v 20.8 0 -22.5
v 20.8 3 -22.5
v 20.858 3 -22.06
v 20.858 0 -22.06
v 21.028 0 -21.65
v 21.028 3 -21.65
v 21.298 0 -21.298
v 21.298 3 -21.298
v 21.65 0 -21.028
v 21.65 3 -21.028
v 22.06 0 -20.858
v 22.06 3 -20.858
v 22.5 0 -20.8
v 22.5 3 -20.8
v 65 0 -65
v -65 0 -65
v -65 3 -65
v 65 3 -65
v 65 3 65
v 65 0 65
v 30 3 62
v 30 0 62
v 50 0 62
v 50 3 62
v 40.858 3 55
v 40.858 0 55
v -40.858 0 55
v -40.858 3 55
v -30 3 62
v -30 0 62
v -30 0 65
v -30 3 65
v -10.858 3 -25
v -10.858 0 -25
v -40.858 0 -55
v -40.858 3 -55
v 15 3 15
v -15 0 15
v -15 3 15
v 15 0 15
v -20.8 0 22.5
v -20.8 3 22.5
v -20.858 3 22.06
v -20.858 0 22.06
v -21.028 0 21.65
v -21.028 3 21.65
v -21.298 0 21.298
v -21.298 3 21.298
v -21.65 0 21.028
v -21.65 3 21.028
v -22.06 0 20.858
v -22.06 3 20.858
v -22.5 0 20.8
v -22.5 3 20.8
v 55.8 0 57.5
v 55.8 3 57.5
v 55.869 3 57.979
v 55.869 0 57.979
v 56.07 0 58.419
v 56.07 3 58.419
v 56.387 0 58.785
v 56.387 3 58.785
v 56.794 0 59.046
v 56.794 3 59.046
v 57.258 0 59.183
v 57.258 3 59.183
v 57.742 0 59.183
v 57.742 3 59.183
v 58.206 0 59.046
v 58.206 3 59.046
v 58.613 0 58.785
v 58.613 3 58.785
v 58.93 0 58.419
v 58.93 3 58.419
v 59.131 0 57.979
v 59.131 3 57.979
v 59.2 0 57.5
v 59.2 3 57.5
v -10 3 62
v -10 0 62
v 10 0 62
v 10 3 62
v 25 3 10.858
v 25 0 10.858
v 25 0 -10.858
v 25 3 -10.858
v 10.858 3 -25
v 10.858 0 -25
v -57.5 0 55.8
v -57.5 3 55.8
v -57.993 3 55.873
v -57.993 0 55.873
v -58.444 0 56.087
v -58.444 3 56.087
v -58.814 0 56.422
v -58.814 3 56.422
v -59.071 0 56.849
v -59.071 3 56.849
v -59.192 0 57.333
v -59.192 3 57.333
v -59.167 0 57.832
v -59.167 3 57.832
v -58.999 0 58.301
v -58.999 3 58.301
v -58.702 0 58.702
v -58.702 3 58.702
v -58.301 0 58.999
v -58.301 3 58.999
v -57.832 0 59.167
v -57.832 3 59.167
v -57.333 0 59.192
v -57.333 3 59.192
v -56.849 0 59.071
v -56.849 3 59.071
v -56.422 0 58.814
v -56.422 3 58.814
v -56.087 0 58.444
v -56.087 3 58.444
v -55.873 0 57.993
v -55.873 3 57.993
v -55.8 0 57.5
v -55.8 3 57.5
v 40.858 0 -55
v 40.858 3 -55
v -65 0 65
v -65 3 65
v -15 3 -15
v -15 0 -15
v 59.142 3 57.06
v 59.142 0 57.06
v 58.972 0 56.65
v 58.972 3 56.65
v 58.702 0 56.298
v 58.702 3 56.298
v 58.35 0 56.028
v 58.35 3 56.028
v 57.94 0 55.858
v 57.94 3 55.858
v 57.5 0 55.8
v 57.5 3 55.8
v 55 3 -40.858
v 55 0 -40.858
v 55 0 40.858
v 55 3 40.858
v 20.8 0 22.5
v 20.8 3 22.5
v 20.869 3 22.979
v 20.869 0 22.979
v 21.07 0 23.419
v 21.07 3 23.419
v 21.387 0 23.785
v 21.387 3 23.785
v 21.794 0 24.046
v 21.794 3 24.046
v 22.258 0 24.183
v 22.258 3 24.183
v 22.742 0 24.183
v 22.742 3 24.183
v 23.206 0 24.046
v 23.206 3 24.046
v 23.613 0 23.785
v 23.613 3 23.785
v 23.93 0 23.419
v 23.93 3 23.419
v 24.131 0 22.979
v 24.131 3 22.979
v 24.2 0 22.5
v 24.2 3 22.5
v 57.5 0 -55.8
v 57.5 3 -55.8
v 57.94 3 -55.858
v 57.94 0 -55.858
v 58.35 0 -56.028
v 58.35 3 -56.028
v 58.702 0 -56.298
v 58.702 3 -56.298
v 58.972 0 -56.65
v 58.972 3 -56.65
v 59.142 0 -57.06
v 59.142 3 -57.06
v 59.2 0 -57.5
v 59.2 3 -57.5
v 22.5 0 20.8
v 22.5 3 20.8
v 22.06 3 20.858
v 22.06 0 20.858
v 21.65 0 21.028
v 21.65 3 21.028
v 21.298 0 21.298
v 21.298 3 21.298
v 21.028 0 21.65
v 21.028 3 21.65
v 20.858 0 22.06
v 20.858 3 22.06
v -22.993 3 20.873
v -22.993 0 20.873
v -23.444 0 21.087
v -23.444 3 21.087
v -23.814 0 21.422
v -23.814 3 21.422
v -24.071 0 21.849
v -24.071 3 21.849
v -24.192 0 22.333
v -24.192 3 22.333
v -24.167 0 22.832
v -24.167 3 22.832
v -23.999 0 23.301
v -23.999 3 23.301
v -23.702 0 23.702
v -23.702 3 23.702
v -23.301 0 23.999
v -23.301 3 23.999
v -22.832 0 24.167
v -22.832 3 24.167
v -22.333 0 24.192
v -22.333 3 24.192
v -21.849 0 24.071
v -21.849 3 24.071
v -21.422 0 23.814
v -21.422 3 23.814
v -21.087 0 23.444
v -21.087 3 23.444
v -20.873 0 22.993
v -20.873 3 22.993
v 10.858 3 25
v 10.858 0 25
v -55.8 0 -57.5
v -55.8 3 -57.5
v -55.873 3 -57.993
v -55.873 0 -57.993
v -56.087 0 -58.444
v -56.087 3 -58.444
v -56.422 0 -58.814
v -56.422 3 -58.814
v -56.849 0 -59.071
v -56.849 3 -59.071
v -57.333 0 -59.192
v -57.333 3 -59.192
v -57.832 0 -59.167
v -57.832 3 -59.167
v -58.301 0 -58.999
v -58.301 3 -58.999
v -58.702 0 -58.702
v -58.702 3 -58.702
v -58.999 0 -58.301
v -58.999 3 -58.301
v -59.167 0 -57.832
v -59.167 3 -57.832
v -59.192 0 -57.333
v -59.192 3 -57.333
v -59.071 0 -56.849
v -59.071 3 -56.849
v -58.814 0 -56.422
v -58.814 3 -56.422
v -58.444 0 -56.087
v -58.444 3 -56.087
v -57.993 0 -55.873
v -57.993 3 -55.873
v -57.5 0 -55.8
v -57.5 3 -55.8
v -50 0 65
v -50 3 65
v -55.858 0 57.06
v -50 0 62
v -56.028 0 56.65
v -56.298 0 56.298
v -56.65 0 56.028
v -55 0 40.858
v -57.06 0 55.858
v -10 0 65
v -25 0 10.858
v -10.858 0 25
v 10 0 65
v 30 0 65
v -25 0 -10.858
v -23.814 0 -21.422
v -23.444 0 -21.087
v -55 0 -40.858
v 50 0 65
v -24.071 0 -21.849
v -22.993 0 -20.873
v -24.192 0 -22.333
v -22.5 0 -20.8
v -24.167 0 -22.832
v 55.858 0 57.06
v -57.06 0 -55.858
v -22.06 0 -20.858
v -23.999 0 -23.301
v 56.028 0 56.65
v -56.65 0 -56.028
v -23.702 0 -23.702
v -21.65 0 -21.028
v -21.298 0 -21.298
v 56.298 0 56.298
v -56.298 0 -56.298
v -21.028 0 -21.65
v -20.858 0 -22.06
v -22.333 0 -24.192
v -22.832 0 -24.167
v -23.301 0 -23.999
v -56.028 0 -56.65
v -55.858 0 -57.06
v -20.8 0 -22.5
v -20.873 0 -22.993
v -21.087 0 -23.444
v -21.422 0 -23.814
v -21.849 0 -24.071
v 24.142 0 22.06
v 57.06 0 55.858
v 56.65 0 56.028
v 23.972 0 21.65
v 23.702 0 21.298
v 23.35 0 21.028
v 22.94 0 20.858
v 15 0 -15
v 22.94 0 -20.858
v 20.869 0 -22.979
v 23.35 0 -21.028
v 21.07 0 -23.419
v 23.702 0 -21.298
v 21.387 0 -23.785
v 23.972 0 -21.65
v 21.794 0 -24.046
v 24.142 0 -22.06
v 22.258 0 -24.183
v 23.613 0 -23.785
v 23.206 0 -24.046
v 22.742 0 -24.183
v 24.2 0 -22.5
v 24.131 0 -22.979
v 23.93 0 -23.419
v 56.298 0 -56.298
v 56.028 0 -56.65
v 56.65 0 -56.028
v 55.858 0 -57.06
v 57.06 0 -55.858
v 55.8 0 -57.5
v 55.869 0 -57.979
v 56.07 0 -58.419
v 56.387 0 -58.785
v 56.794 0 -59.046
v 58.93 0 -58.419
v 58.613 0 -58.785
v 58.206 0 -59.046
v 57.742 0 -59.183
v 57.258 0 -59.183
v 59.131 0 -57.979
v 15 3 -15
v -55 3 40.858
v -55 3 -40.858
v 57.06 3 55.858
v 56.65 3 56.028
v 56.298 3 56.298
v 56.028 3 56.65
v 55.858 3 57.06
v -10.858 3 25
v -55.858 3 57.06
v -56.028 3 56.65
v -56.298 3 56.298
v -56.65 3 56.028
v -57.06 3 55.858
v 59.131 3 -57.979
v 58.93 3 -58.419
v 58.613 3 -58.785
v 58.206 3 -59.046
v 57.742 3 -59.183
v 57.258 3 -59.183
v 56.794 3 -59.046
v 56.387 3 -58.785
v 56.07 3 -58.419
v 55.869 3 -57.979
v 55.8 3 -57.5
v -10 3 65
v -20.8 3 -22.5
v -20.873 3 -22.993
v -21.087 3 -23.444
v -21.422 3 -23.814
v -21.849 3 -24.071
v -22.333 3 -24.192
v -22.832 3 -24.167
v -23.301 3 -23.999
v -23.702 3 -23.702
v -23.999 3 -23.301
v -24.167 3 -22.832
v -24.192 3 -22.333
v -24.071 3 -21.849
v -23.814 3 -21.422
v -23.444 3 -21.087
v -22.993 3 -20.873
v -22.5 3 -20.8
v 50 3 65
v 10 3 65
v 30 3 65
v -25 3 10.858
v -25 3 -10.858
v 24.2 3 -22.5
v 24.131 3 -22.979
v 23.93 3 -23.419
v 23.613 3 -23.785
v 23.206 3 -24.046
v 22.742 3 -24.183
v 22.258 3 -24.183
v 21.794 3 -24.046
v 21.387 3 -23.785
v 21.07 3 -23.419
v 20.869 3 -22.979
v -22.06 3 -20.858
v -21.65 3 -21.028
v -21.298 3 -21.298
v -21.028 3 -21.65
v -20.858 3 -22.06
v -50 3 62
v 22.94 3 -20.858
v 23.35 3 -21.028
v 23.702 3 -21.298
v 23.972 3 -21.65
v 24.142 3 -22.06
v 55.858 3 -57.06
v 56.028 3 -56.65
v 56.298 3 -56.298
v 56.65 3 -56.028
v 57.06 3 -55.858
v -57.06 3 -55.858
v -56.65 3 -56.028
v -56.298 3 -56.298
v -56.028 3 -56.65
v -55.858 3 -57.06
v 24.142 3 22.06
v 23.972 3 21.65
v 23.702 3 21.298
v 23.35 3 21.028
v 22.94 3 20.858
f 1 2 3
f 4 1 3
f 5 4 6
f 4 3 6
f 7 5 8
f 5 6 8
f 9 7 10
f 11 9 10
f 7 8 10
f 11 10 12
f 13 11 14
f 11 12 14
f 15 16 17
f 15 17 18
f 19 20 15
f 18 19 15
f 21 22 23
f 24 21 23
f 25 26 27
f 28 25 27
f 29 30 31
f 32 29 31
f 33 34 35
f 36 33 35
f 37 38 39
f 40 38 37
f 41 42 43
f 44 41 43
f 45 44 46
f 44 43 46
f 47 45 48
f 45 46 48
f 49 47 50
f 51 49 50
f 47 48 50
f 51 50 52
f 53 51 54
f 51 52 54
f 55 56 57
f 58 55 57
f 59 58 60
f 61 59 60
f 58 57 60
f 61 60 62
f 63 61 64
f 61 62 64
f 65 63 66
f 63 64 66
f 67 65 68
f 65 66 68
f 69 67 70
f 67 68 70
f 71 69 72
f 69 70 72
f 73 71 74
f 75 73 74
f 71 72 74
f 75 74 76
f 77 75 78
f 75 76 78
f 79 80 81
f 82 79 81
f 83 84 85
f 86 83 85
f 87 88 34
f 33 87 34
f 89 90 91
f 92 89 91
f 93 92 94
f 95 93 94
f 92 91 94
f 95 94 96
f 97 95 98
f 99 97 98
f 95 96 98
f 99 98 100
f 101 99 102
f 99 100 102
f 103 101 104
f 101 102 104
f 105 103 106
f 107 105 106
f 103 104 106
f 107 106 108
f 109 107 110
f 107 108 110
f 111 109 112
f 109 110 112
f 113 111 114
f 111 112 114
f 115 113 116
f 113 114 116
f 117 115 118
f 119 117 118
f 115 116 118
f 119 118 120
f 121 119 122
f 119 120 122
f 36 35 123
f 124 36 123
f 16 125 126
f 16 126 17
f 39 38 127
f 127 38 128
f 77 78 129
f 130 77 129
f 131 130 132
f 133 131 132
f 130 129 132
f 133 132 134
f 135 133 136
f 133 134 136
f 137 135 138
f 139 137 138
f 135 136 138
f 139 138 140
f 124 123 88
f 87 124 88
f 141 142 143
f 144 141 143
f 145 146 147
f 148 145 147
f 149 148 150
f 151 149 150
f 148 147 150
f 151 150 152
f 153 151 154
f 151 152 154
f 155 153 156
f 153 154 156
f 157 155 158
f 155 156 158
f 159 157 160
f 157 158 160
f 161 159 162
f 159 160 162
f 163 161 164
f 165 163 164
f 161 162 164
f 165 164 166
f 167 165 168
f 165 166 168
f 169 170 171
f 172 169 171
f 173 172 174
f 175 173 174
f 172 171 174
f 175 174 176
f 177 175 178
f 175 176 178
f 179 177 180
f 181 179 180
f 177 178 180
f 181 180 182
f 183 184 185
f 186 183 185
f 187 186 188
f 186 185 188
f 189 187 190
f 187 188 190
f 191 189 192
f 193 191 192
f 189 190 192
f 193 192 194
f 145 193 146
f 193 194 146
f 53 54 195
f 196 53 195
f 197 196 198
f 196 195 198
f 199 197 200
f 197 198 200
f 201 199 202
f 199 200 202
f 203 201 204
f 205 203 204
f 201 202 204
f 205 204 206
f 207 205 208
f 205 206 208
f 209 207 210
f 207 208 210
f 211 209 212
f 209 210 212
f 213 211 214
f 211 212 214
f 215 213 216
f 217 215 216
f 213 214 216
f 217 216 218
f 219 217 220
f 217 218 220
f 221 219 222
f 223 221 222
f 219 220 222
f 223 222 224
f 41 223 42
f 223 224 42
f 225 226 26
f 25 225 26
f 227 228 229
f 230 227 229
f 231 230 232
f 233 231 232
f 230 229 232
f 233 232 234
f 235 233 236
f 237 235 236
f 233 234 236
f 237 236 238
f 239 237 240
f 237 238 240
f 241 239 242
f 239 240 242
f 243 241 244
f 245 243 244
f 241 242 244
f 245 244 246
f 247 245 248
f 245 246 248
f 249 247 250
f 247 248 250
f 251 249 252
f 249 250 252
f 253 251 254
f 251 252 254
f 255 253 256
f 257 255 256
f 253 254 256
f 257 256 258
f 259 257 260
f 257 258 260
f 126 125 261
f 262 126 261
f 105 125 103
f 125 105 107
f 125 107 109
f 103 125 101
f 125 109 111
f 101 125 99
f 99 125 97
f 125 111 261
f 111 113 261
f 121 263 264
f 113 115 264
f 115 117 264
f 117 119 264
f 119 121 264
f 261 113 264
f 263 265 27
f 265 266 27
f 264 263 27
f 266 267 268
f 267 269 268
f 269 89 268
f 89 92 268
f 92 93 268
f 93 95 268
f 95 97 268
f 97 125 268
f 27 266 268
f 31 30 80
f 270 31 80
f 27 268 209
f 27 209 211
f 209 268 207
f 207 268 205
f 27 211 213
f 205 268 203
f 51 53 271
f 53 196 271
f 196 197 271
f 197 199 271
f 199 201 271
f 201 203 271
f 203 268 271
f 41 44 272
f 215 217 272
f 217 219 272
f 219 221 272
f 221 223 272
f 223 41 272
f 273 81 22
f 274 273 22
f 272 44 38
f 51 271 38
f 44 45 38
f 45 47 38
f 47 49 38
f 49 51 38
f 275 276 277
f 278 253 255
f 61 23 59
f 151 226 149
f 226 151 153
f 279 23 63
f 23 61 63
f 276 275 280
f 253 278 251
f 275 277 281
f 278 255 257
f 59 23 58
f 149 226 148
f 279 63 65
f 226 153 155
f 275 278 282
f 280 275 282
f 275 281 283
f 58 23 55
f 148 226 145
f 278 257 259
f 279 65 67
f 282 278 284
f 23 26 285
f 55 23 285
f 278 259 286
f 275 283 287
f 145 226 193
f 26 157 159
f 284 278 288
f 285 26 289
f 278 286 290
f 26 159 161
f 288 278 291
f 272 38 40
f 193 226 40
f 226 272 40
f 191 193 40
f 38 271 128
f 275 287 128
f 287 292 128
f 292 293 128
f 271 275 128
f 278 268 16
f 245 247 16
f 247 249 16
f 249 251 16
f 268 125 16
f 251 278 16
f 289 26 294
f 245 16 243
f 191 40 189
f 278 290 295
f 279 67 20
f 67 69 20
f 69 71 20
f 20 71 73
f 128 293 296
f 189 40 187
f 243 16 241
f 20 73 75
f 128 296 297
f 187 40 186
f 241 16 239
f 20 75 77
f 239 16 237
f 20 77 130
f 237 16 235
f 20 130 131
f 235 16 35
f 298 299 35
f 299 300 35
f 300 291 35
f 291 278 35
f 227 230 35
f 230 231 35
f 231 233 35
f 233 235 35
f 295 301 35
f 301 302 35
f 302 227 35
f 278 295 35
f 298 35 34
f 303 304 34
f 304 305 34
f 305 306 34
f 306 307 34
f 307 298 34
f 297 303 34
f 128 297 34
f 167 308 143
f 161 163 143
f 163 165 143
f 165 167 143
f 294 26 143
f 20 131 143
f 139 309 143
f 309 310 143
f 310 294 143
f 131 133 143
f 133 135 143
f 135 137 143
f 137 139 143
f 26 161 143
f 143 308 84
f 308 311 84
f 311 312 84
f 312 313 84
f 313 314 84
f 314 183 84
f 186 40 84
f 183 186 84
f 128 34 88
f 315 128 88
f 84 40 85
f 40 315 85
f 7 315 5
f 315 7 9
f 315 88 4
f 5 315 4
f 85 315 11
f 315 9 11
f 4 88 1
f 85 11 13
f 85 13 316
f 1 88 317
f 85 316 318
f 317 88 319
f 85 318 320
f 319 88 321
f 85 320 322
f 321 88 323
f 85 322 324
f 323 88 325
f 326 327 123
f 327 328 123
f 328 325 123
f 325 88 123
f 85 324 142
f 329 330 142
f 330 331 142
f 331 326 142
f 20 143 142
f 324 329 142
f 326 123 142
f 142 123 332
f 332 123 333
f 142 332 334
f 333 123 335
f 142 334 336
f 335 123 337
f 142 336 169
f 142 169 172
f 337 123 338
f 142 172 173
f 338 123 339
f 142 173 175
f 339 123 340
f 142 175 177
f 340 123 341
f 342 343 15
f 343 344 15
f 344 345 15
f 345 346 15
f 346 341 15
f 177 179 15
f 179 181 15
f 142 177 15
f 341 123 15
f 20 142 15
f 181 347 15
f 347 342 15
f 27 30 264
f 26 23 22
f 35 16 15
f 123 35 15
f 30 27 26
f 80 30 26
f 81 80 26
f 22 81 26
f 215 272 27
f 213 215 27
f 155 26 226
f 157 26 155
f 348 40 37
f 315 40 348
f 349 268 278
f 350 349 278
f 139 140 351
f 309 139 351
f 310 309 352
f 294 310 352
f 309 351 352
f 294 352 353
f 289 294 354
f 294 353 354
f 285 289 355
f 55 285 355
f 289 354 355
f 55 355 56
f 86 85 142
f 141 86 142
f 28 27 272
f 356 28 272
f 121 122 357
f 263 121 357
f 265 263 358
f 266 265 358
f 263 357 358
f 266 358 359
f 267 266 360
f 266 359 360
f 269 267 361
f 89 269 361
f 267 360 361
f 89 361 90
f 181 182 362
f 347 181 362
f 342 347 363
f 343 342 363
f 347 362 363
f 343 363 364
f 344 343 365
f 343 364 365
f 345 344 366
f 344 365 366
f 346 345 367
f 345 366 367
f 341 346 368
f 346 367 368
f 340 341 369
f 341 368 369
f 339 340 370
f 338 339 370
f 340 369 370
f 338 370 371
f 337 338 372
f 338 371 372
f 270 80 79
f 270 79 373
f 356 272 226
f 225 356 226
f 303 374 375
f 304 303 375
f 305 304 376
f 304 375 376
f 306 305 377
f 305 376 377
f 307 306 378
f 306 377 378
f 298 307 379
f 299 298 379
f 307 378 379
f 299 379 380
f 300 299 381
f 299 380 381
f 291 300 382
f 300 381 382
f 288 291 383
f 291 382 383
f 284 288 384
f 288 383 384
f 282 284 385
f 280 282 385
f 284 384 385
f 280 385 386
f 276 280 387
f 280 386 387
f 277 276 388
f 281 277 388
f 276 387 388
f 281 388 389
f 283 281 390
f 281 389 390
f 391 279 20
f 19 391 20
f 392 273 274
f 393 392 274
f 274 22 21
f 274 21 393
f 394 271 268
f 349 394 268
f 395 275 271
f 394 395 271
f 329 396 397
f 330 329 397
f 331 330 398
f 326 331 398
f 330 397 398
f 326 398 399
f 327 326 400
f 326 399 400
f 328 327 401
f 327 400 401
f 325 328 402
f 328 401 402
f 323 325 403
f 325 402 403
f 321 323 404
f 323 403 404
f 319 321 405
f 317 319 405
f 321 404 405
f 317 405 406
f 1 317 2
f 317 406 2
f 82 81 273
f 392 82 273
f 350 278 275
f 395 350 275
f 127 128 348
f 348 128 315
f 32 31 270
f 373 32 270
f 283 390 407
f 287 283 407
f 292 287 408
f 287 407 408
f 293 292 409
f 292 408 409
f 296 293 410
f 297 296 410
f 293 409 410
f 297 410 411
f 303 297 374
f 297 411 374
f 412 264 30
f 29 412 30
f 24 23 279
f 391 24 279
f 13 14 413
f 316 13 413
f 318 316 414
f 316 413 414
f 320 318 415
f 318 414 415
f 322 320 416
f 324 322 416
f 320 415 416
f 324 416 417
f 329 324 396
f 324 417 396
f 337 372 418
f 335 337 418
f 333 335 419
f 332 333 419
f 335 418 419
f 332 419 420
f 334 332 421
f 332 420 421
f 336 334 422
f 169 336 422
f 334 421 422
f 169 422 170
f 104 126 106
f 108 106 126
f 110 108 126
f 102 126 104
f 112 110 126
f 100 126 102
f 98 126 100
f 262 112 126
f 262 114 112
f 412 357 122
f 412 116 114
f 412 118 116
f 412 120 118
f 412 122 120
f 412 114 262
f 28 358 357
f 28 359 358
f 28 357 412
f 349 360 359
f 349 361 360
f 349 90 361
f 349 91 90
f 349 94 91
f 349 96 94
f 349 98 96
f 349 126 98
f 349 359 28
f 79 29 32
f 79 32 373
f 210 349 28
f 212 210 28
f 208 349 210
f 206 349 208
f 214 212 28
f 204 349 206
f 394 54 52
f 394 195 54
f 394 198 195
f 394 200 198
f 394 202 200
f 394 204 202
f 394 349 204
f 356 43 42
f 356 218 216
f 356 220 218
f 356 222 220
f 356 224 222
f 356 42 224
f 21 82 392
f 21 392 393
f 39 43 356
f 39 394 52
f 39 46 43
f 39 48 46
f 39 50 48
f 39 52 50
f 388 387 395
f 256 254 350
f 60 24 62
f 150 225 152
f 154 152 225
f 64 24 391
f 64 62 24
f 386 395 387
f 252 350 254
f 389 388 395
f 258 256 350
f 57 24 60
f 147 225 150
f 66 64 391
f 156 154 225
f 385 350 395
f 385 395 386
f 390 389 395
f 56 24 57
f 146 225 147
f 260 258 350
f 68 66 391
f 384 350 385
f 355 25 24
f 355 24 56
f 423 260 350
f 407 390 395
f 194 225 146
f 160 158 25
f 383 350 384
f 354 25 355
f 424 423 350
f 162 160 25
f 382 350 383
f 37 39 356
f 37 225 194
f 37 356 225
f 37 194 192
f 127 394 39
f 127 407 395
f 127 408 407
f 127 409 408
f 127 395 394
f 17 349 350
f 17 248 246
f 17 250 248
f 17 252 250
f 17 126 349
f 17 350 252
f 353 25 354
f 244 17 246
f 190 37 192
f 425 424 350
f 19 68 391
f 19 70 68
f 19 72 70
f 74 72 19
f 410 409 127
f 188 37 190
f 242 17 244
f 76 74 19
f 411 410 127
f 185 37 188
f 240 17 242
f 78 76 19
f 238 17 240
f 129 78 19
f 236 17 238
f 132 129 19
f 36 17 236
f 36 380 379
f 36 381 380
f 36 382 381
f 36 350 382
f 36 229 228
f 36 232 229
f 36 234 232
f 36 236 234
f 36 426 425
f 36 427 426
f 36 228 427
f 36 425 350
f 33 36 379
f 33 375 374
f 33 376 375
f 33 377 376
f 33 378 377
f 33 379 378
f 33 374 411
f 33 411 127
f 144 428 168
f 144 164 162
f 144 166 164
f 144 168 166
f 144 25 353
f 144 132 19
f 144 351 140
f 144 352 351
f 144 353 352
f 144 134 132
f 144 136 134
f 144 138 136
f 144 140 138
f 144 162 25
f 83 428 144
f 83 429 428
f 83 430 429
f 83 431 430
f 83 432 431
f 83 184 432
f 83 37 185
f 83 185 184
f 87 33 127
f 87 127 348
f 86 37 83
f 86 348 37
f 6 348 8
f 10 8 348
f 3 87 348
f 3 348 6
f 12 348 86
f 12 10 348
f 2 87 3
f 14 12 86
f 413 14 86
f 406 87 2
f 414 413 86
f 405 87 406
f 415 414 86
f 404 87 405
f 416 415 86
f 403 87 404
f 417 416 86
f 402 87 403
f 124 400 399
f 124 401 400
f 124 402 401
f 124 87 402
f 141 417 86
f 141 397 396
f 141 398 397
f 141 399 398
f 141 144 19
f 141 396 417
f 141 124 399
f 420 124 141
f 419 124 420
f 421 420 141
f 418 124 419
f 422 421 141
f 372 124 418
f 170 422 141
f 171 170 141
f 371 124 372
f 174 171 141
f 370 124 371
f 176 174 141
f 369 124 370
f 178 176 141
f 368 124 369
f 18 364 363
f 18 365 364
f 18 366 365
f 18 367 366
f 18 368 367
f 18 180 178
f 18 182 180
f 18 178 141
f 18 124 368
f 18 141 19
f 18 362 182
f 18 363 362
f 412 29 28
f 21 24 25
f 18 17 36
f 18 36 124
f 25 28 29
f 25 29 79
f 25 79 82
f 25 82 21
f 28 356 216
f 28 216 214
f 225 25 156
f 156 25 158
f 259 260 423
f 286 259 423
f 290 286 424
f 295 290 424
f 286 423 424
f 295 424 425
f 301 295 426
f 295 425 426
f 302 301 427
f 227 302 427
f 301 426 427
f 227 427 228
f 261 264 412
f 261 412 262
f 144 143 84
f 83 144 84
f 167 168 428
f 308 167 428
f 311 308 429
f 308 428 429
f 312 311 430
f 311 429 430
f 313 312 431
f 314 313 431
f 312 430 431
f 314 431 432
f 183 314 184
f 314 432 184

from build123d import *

# Parameters (mm, degrees)
SKETCH1_W           = 130
SKETCH1_H           = 130
SKETCH1_W_2         = 30
SKETCH1_H_2         = 30
BOSS_EXTRUDE1_DEPTH = 3
CUT_EXTRUDE1_DEPTH  = 3
CUT_EXTRUDE2_DEPTH  = 3
SKETCH4_W           = 20
SKETCH4_H           = 3
SKETCH4_W_2         = 10
CUT_EXTRUDE3_DEPTH  = 10


with BuildPart() as part:
    # Sketch1 → Boss-Extrude1 (new body)
    with BuildSketch(Plane(origin=(0, 0, 0), x_dir=(1, 0, 0), z_dir=(0, 1, 0))):
        Rectangle(SKETCH1_W, SKETCH1_H)
        Polygon((-55, 40.857864376), (-25, 10.857864376), (-25, -10.857864376), (-55, -40.857864376), align=None, mode=Mode.SUBTRACT)
        Polygon((-40.857864376, -55), (-10.857864376, -25), (10.857864376, -25), (40.857864376, -55), align=None, mode=Mode.SUBTRACT)
        Polygon((55, -40.857864376), (25, -10.857864376), (25, 10.857864376), (55, 40.857864376), align=None, mode=Mode.SUBTRACT)
        Polygon((40.857864376, 55), (10.857864376, 25), (-10.857864376, 25), (-40.857864376, 55), align=None, mode=Mode.SUBTRACT)
        Rectangle(SKETCH1_W_2, SKETCH1_H_2, mode=Mode.SUBTRACT)
    extrude(amount=BOSS_EXTRUDE1_DEPTH)

    # Sketch2 → Cut-Extrude1 (cut)
    with BuildSketch(Plane(origin=(0, 3, 0), x_dir=(1, 0, 0), z_dir=(0, 1, 0))):
        with BuildLine():
            ThreePointArc((-55.8, 57.5), (-58.702081528, 58.702081528), (-57.5, 55.8))
            Line((-57.5, 55.8), (-57.5, 57.5))
            Line((-57.5, 57.5), (-55.8, 57.5))
        make_face()
        with BuildLine():
            Line((-57.5, 57.5), (-57.5, 55.8))
            ThreePointArc((-57.5, 55.8), (-56.297918472, 56.297918472), (-55.8, 57.5))
            Line((-55.8, 57.5), (-57.5, 57.5))
        make_face()
        with BuildLine():
            Line((-57.5, -55.8), (-57.5, -57.5))
            Line((-57.5, -57.5), (-55.8, -57.5))
            ThreePointArc((-55.8, -57.5), (-56.297918472, -56.297918472), (-57.5, -55.8))
        make_face()
        with BuildLine():
            Line((-55.8, -57.5), (-57.5, -57.5))
            Line((-57.5, -57.5), (-57.5, -55.8))
            ThreePointArc((-57.5, -55.8), (-58.702081528, -58.702081528), (-55.8, -57.5))
        make_face()
        with BuildLine():
            ThreePointArc((57.5, -55.8), (56.297918472, -56.297918472), (55.8, -57.5))
            Line((55.8, -57.5), (57.5, -57.5))
            Line((57.5, -57.5), (57.5, -55.8))
        make_face()
        with BuildLine():
            Line((57.5, -57.5), (55.8, -57.5))
            ThreePointArc((55.8, -57.5), (57.5, -59.2), (59.2, -57.5))
            ThreePointArc((59.2, -57.5), (58.702081528, -56.297918472), (57.5, -55.8))
            Line((57.5, -55.8), (57.5, -57.5))
        make_face()
        with BuildLine():
            ThreePointArc((55.8, 57.5), (56.297918472, 56.297918472), (57.5, 55.8))
            Line((57.5, 55.8), (57.5, 57.5))
            Line((57.5, 57.5), (55.8, 57.5))
        make_face()
        with BuildLine():
            Line((57.5, 57.5), (57.5, 55.8))
            ThreePointArc((57.5, 55.8), (58.702081528, 56.297918472), (59.2, 57.5))
            ThreePointArc((59.2, 57.5), (57.5, 59.2), (55.8, 57.5))
            Line((55.8, 57.5), (57.5, 57.5))
        make_face()
    extrude(amount=-CUT_EXTRUDE1_DEPTH, mode=Mode.SUBTRACT)

    # Sketch3 → Cut-Extrude2 (cut)
    with BuildSketch(Plane(origin=(0, 3, 0), x_dir=(1, 0, 0), z_dir=(0, 1, 0))):
        with BuildLine():
            Line((-22.5, -20.8), (-22.5, -22.5))
            Line((-22.5, -22.5), (-20.8, -22.5))
            ThreePointArc((-20.8, -22.5), (-21.297918472, -21.297918472), (-22.5, -20.8))
        make_face()
        with BuildLine():
            Line((-20.8, -22.5), (-22.5, -22.5))
            Line((-22.5, -22.5), (-22.5, -20.8))
            ThreePointArc((-22.5, -20.8), (-23.702081528, -23.702081528), (-20.8, -22.5))
        make_face()
        with BuildLine():
            ThreePointArc((-20.8, 22.5), (-23.702081528, 23.702081528), (-22.5, 20.8))
            Line((-22.5, 20.8), (-22.5, 22.5))
            Line((-22.5, 22.5), (-20.8, 22.5))
        make_face()
        with BuildLine():
            Line((-22.5, 22.5), (-22.5, 20.8))
            ThreePointArc((-22.5, 20.8), (-21.297918472, 21.297918472), (-20.8, 22.5))
            Line((-20.8, 22.5), (-22.5, 22.5))
        make_face()
        with BuildLine():
            ThreePointArc((22.5, -20.8), (21.297918472, -21.297918472), (20.8, -22.5))
            Line((20.8, -22.5), (22.5, -22.5))
            Line((22.5, -22.5), (22.5, -20.8))
        make_face()
        with BuildLine():
            Line((22.5, -22.5), (20.8, -22.5))
            ThreePointArc((20.8, -22.5), (22.5, -24.2), (24.2, -22.5))
            ThreePointArc((24.2, -22.5), (23.702081528, -21.297918472), (22.5, -20.8))
            Line((22.5, -20.8), (22.5, -22.5))
        make_face()
        with BuildLine():
            ThreePointArc((20.8, 22.5), (21.297918472, 21.297918472), (22.5, 20.8))
            Line((22.5, 20.8), (22.5, 22.5))
            Line((22.5, 22.5), (20.8, 22.5))
        make_face()
        with BuildLine():
            Line((22.5, 22.5), (22.5, 20.8))
            ThreePointArc((22.5, 20.8), (23.702081528, 21.297918472), (24.2, 22.5))
            ThreePointArc((24.2, 22.5), (22.5, 24.2), (20.8, 22.5))
            Line((20.8, 22.5), (22.5, 22.5))
        make_face()
    extrude(amount=-CUT_EXTRUDE2_DEPTH, mode=Mode.SUBTRACT)

    # Sketch4 → Cut-Extrude3 (cut)
    with BuildSketch(Plane.XZ):
        with Locations((40, 63.5)):
            Rectangle(SKETCH4_W, SKETCH4_H)
        with Locations((5, 63.5)):
            Rectangle(SKETCH4_W_2, SKETCH4_H)
        with Locations((-5, 63.5)):
            Rectangle(SKETCH4_W_2, SKETCH4_H)
        with Locations((-40, 63.5)):
            Rectangle(SKETCH4_W, SKETCH4_H)
    extrude(amount=-CUT_EXTRUDE3_DEPTH, mode=Mode.SUBTRACT)


solid = part.part
